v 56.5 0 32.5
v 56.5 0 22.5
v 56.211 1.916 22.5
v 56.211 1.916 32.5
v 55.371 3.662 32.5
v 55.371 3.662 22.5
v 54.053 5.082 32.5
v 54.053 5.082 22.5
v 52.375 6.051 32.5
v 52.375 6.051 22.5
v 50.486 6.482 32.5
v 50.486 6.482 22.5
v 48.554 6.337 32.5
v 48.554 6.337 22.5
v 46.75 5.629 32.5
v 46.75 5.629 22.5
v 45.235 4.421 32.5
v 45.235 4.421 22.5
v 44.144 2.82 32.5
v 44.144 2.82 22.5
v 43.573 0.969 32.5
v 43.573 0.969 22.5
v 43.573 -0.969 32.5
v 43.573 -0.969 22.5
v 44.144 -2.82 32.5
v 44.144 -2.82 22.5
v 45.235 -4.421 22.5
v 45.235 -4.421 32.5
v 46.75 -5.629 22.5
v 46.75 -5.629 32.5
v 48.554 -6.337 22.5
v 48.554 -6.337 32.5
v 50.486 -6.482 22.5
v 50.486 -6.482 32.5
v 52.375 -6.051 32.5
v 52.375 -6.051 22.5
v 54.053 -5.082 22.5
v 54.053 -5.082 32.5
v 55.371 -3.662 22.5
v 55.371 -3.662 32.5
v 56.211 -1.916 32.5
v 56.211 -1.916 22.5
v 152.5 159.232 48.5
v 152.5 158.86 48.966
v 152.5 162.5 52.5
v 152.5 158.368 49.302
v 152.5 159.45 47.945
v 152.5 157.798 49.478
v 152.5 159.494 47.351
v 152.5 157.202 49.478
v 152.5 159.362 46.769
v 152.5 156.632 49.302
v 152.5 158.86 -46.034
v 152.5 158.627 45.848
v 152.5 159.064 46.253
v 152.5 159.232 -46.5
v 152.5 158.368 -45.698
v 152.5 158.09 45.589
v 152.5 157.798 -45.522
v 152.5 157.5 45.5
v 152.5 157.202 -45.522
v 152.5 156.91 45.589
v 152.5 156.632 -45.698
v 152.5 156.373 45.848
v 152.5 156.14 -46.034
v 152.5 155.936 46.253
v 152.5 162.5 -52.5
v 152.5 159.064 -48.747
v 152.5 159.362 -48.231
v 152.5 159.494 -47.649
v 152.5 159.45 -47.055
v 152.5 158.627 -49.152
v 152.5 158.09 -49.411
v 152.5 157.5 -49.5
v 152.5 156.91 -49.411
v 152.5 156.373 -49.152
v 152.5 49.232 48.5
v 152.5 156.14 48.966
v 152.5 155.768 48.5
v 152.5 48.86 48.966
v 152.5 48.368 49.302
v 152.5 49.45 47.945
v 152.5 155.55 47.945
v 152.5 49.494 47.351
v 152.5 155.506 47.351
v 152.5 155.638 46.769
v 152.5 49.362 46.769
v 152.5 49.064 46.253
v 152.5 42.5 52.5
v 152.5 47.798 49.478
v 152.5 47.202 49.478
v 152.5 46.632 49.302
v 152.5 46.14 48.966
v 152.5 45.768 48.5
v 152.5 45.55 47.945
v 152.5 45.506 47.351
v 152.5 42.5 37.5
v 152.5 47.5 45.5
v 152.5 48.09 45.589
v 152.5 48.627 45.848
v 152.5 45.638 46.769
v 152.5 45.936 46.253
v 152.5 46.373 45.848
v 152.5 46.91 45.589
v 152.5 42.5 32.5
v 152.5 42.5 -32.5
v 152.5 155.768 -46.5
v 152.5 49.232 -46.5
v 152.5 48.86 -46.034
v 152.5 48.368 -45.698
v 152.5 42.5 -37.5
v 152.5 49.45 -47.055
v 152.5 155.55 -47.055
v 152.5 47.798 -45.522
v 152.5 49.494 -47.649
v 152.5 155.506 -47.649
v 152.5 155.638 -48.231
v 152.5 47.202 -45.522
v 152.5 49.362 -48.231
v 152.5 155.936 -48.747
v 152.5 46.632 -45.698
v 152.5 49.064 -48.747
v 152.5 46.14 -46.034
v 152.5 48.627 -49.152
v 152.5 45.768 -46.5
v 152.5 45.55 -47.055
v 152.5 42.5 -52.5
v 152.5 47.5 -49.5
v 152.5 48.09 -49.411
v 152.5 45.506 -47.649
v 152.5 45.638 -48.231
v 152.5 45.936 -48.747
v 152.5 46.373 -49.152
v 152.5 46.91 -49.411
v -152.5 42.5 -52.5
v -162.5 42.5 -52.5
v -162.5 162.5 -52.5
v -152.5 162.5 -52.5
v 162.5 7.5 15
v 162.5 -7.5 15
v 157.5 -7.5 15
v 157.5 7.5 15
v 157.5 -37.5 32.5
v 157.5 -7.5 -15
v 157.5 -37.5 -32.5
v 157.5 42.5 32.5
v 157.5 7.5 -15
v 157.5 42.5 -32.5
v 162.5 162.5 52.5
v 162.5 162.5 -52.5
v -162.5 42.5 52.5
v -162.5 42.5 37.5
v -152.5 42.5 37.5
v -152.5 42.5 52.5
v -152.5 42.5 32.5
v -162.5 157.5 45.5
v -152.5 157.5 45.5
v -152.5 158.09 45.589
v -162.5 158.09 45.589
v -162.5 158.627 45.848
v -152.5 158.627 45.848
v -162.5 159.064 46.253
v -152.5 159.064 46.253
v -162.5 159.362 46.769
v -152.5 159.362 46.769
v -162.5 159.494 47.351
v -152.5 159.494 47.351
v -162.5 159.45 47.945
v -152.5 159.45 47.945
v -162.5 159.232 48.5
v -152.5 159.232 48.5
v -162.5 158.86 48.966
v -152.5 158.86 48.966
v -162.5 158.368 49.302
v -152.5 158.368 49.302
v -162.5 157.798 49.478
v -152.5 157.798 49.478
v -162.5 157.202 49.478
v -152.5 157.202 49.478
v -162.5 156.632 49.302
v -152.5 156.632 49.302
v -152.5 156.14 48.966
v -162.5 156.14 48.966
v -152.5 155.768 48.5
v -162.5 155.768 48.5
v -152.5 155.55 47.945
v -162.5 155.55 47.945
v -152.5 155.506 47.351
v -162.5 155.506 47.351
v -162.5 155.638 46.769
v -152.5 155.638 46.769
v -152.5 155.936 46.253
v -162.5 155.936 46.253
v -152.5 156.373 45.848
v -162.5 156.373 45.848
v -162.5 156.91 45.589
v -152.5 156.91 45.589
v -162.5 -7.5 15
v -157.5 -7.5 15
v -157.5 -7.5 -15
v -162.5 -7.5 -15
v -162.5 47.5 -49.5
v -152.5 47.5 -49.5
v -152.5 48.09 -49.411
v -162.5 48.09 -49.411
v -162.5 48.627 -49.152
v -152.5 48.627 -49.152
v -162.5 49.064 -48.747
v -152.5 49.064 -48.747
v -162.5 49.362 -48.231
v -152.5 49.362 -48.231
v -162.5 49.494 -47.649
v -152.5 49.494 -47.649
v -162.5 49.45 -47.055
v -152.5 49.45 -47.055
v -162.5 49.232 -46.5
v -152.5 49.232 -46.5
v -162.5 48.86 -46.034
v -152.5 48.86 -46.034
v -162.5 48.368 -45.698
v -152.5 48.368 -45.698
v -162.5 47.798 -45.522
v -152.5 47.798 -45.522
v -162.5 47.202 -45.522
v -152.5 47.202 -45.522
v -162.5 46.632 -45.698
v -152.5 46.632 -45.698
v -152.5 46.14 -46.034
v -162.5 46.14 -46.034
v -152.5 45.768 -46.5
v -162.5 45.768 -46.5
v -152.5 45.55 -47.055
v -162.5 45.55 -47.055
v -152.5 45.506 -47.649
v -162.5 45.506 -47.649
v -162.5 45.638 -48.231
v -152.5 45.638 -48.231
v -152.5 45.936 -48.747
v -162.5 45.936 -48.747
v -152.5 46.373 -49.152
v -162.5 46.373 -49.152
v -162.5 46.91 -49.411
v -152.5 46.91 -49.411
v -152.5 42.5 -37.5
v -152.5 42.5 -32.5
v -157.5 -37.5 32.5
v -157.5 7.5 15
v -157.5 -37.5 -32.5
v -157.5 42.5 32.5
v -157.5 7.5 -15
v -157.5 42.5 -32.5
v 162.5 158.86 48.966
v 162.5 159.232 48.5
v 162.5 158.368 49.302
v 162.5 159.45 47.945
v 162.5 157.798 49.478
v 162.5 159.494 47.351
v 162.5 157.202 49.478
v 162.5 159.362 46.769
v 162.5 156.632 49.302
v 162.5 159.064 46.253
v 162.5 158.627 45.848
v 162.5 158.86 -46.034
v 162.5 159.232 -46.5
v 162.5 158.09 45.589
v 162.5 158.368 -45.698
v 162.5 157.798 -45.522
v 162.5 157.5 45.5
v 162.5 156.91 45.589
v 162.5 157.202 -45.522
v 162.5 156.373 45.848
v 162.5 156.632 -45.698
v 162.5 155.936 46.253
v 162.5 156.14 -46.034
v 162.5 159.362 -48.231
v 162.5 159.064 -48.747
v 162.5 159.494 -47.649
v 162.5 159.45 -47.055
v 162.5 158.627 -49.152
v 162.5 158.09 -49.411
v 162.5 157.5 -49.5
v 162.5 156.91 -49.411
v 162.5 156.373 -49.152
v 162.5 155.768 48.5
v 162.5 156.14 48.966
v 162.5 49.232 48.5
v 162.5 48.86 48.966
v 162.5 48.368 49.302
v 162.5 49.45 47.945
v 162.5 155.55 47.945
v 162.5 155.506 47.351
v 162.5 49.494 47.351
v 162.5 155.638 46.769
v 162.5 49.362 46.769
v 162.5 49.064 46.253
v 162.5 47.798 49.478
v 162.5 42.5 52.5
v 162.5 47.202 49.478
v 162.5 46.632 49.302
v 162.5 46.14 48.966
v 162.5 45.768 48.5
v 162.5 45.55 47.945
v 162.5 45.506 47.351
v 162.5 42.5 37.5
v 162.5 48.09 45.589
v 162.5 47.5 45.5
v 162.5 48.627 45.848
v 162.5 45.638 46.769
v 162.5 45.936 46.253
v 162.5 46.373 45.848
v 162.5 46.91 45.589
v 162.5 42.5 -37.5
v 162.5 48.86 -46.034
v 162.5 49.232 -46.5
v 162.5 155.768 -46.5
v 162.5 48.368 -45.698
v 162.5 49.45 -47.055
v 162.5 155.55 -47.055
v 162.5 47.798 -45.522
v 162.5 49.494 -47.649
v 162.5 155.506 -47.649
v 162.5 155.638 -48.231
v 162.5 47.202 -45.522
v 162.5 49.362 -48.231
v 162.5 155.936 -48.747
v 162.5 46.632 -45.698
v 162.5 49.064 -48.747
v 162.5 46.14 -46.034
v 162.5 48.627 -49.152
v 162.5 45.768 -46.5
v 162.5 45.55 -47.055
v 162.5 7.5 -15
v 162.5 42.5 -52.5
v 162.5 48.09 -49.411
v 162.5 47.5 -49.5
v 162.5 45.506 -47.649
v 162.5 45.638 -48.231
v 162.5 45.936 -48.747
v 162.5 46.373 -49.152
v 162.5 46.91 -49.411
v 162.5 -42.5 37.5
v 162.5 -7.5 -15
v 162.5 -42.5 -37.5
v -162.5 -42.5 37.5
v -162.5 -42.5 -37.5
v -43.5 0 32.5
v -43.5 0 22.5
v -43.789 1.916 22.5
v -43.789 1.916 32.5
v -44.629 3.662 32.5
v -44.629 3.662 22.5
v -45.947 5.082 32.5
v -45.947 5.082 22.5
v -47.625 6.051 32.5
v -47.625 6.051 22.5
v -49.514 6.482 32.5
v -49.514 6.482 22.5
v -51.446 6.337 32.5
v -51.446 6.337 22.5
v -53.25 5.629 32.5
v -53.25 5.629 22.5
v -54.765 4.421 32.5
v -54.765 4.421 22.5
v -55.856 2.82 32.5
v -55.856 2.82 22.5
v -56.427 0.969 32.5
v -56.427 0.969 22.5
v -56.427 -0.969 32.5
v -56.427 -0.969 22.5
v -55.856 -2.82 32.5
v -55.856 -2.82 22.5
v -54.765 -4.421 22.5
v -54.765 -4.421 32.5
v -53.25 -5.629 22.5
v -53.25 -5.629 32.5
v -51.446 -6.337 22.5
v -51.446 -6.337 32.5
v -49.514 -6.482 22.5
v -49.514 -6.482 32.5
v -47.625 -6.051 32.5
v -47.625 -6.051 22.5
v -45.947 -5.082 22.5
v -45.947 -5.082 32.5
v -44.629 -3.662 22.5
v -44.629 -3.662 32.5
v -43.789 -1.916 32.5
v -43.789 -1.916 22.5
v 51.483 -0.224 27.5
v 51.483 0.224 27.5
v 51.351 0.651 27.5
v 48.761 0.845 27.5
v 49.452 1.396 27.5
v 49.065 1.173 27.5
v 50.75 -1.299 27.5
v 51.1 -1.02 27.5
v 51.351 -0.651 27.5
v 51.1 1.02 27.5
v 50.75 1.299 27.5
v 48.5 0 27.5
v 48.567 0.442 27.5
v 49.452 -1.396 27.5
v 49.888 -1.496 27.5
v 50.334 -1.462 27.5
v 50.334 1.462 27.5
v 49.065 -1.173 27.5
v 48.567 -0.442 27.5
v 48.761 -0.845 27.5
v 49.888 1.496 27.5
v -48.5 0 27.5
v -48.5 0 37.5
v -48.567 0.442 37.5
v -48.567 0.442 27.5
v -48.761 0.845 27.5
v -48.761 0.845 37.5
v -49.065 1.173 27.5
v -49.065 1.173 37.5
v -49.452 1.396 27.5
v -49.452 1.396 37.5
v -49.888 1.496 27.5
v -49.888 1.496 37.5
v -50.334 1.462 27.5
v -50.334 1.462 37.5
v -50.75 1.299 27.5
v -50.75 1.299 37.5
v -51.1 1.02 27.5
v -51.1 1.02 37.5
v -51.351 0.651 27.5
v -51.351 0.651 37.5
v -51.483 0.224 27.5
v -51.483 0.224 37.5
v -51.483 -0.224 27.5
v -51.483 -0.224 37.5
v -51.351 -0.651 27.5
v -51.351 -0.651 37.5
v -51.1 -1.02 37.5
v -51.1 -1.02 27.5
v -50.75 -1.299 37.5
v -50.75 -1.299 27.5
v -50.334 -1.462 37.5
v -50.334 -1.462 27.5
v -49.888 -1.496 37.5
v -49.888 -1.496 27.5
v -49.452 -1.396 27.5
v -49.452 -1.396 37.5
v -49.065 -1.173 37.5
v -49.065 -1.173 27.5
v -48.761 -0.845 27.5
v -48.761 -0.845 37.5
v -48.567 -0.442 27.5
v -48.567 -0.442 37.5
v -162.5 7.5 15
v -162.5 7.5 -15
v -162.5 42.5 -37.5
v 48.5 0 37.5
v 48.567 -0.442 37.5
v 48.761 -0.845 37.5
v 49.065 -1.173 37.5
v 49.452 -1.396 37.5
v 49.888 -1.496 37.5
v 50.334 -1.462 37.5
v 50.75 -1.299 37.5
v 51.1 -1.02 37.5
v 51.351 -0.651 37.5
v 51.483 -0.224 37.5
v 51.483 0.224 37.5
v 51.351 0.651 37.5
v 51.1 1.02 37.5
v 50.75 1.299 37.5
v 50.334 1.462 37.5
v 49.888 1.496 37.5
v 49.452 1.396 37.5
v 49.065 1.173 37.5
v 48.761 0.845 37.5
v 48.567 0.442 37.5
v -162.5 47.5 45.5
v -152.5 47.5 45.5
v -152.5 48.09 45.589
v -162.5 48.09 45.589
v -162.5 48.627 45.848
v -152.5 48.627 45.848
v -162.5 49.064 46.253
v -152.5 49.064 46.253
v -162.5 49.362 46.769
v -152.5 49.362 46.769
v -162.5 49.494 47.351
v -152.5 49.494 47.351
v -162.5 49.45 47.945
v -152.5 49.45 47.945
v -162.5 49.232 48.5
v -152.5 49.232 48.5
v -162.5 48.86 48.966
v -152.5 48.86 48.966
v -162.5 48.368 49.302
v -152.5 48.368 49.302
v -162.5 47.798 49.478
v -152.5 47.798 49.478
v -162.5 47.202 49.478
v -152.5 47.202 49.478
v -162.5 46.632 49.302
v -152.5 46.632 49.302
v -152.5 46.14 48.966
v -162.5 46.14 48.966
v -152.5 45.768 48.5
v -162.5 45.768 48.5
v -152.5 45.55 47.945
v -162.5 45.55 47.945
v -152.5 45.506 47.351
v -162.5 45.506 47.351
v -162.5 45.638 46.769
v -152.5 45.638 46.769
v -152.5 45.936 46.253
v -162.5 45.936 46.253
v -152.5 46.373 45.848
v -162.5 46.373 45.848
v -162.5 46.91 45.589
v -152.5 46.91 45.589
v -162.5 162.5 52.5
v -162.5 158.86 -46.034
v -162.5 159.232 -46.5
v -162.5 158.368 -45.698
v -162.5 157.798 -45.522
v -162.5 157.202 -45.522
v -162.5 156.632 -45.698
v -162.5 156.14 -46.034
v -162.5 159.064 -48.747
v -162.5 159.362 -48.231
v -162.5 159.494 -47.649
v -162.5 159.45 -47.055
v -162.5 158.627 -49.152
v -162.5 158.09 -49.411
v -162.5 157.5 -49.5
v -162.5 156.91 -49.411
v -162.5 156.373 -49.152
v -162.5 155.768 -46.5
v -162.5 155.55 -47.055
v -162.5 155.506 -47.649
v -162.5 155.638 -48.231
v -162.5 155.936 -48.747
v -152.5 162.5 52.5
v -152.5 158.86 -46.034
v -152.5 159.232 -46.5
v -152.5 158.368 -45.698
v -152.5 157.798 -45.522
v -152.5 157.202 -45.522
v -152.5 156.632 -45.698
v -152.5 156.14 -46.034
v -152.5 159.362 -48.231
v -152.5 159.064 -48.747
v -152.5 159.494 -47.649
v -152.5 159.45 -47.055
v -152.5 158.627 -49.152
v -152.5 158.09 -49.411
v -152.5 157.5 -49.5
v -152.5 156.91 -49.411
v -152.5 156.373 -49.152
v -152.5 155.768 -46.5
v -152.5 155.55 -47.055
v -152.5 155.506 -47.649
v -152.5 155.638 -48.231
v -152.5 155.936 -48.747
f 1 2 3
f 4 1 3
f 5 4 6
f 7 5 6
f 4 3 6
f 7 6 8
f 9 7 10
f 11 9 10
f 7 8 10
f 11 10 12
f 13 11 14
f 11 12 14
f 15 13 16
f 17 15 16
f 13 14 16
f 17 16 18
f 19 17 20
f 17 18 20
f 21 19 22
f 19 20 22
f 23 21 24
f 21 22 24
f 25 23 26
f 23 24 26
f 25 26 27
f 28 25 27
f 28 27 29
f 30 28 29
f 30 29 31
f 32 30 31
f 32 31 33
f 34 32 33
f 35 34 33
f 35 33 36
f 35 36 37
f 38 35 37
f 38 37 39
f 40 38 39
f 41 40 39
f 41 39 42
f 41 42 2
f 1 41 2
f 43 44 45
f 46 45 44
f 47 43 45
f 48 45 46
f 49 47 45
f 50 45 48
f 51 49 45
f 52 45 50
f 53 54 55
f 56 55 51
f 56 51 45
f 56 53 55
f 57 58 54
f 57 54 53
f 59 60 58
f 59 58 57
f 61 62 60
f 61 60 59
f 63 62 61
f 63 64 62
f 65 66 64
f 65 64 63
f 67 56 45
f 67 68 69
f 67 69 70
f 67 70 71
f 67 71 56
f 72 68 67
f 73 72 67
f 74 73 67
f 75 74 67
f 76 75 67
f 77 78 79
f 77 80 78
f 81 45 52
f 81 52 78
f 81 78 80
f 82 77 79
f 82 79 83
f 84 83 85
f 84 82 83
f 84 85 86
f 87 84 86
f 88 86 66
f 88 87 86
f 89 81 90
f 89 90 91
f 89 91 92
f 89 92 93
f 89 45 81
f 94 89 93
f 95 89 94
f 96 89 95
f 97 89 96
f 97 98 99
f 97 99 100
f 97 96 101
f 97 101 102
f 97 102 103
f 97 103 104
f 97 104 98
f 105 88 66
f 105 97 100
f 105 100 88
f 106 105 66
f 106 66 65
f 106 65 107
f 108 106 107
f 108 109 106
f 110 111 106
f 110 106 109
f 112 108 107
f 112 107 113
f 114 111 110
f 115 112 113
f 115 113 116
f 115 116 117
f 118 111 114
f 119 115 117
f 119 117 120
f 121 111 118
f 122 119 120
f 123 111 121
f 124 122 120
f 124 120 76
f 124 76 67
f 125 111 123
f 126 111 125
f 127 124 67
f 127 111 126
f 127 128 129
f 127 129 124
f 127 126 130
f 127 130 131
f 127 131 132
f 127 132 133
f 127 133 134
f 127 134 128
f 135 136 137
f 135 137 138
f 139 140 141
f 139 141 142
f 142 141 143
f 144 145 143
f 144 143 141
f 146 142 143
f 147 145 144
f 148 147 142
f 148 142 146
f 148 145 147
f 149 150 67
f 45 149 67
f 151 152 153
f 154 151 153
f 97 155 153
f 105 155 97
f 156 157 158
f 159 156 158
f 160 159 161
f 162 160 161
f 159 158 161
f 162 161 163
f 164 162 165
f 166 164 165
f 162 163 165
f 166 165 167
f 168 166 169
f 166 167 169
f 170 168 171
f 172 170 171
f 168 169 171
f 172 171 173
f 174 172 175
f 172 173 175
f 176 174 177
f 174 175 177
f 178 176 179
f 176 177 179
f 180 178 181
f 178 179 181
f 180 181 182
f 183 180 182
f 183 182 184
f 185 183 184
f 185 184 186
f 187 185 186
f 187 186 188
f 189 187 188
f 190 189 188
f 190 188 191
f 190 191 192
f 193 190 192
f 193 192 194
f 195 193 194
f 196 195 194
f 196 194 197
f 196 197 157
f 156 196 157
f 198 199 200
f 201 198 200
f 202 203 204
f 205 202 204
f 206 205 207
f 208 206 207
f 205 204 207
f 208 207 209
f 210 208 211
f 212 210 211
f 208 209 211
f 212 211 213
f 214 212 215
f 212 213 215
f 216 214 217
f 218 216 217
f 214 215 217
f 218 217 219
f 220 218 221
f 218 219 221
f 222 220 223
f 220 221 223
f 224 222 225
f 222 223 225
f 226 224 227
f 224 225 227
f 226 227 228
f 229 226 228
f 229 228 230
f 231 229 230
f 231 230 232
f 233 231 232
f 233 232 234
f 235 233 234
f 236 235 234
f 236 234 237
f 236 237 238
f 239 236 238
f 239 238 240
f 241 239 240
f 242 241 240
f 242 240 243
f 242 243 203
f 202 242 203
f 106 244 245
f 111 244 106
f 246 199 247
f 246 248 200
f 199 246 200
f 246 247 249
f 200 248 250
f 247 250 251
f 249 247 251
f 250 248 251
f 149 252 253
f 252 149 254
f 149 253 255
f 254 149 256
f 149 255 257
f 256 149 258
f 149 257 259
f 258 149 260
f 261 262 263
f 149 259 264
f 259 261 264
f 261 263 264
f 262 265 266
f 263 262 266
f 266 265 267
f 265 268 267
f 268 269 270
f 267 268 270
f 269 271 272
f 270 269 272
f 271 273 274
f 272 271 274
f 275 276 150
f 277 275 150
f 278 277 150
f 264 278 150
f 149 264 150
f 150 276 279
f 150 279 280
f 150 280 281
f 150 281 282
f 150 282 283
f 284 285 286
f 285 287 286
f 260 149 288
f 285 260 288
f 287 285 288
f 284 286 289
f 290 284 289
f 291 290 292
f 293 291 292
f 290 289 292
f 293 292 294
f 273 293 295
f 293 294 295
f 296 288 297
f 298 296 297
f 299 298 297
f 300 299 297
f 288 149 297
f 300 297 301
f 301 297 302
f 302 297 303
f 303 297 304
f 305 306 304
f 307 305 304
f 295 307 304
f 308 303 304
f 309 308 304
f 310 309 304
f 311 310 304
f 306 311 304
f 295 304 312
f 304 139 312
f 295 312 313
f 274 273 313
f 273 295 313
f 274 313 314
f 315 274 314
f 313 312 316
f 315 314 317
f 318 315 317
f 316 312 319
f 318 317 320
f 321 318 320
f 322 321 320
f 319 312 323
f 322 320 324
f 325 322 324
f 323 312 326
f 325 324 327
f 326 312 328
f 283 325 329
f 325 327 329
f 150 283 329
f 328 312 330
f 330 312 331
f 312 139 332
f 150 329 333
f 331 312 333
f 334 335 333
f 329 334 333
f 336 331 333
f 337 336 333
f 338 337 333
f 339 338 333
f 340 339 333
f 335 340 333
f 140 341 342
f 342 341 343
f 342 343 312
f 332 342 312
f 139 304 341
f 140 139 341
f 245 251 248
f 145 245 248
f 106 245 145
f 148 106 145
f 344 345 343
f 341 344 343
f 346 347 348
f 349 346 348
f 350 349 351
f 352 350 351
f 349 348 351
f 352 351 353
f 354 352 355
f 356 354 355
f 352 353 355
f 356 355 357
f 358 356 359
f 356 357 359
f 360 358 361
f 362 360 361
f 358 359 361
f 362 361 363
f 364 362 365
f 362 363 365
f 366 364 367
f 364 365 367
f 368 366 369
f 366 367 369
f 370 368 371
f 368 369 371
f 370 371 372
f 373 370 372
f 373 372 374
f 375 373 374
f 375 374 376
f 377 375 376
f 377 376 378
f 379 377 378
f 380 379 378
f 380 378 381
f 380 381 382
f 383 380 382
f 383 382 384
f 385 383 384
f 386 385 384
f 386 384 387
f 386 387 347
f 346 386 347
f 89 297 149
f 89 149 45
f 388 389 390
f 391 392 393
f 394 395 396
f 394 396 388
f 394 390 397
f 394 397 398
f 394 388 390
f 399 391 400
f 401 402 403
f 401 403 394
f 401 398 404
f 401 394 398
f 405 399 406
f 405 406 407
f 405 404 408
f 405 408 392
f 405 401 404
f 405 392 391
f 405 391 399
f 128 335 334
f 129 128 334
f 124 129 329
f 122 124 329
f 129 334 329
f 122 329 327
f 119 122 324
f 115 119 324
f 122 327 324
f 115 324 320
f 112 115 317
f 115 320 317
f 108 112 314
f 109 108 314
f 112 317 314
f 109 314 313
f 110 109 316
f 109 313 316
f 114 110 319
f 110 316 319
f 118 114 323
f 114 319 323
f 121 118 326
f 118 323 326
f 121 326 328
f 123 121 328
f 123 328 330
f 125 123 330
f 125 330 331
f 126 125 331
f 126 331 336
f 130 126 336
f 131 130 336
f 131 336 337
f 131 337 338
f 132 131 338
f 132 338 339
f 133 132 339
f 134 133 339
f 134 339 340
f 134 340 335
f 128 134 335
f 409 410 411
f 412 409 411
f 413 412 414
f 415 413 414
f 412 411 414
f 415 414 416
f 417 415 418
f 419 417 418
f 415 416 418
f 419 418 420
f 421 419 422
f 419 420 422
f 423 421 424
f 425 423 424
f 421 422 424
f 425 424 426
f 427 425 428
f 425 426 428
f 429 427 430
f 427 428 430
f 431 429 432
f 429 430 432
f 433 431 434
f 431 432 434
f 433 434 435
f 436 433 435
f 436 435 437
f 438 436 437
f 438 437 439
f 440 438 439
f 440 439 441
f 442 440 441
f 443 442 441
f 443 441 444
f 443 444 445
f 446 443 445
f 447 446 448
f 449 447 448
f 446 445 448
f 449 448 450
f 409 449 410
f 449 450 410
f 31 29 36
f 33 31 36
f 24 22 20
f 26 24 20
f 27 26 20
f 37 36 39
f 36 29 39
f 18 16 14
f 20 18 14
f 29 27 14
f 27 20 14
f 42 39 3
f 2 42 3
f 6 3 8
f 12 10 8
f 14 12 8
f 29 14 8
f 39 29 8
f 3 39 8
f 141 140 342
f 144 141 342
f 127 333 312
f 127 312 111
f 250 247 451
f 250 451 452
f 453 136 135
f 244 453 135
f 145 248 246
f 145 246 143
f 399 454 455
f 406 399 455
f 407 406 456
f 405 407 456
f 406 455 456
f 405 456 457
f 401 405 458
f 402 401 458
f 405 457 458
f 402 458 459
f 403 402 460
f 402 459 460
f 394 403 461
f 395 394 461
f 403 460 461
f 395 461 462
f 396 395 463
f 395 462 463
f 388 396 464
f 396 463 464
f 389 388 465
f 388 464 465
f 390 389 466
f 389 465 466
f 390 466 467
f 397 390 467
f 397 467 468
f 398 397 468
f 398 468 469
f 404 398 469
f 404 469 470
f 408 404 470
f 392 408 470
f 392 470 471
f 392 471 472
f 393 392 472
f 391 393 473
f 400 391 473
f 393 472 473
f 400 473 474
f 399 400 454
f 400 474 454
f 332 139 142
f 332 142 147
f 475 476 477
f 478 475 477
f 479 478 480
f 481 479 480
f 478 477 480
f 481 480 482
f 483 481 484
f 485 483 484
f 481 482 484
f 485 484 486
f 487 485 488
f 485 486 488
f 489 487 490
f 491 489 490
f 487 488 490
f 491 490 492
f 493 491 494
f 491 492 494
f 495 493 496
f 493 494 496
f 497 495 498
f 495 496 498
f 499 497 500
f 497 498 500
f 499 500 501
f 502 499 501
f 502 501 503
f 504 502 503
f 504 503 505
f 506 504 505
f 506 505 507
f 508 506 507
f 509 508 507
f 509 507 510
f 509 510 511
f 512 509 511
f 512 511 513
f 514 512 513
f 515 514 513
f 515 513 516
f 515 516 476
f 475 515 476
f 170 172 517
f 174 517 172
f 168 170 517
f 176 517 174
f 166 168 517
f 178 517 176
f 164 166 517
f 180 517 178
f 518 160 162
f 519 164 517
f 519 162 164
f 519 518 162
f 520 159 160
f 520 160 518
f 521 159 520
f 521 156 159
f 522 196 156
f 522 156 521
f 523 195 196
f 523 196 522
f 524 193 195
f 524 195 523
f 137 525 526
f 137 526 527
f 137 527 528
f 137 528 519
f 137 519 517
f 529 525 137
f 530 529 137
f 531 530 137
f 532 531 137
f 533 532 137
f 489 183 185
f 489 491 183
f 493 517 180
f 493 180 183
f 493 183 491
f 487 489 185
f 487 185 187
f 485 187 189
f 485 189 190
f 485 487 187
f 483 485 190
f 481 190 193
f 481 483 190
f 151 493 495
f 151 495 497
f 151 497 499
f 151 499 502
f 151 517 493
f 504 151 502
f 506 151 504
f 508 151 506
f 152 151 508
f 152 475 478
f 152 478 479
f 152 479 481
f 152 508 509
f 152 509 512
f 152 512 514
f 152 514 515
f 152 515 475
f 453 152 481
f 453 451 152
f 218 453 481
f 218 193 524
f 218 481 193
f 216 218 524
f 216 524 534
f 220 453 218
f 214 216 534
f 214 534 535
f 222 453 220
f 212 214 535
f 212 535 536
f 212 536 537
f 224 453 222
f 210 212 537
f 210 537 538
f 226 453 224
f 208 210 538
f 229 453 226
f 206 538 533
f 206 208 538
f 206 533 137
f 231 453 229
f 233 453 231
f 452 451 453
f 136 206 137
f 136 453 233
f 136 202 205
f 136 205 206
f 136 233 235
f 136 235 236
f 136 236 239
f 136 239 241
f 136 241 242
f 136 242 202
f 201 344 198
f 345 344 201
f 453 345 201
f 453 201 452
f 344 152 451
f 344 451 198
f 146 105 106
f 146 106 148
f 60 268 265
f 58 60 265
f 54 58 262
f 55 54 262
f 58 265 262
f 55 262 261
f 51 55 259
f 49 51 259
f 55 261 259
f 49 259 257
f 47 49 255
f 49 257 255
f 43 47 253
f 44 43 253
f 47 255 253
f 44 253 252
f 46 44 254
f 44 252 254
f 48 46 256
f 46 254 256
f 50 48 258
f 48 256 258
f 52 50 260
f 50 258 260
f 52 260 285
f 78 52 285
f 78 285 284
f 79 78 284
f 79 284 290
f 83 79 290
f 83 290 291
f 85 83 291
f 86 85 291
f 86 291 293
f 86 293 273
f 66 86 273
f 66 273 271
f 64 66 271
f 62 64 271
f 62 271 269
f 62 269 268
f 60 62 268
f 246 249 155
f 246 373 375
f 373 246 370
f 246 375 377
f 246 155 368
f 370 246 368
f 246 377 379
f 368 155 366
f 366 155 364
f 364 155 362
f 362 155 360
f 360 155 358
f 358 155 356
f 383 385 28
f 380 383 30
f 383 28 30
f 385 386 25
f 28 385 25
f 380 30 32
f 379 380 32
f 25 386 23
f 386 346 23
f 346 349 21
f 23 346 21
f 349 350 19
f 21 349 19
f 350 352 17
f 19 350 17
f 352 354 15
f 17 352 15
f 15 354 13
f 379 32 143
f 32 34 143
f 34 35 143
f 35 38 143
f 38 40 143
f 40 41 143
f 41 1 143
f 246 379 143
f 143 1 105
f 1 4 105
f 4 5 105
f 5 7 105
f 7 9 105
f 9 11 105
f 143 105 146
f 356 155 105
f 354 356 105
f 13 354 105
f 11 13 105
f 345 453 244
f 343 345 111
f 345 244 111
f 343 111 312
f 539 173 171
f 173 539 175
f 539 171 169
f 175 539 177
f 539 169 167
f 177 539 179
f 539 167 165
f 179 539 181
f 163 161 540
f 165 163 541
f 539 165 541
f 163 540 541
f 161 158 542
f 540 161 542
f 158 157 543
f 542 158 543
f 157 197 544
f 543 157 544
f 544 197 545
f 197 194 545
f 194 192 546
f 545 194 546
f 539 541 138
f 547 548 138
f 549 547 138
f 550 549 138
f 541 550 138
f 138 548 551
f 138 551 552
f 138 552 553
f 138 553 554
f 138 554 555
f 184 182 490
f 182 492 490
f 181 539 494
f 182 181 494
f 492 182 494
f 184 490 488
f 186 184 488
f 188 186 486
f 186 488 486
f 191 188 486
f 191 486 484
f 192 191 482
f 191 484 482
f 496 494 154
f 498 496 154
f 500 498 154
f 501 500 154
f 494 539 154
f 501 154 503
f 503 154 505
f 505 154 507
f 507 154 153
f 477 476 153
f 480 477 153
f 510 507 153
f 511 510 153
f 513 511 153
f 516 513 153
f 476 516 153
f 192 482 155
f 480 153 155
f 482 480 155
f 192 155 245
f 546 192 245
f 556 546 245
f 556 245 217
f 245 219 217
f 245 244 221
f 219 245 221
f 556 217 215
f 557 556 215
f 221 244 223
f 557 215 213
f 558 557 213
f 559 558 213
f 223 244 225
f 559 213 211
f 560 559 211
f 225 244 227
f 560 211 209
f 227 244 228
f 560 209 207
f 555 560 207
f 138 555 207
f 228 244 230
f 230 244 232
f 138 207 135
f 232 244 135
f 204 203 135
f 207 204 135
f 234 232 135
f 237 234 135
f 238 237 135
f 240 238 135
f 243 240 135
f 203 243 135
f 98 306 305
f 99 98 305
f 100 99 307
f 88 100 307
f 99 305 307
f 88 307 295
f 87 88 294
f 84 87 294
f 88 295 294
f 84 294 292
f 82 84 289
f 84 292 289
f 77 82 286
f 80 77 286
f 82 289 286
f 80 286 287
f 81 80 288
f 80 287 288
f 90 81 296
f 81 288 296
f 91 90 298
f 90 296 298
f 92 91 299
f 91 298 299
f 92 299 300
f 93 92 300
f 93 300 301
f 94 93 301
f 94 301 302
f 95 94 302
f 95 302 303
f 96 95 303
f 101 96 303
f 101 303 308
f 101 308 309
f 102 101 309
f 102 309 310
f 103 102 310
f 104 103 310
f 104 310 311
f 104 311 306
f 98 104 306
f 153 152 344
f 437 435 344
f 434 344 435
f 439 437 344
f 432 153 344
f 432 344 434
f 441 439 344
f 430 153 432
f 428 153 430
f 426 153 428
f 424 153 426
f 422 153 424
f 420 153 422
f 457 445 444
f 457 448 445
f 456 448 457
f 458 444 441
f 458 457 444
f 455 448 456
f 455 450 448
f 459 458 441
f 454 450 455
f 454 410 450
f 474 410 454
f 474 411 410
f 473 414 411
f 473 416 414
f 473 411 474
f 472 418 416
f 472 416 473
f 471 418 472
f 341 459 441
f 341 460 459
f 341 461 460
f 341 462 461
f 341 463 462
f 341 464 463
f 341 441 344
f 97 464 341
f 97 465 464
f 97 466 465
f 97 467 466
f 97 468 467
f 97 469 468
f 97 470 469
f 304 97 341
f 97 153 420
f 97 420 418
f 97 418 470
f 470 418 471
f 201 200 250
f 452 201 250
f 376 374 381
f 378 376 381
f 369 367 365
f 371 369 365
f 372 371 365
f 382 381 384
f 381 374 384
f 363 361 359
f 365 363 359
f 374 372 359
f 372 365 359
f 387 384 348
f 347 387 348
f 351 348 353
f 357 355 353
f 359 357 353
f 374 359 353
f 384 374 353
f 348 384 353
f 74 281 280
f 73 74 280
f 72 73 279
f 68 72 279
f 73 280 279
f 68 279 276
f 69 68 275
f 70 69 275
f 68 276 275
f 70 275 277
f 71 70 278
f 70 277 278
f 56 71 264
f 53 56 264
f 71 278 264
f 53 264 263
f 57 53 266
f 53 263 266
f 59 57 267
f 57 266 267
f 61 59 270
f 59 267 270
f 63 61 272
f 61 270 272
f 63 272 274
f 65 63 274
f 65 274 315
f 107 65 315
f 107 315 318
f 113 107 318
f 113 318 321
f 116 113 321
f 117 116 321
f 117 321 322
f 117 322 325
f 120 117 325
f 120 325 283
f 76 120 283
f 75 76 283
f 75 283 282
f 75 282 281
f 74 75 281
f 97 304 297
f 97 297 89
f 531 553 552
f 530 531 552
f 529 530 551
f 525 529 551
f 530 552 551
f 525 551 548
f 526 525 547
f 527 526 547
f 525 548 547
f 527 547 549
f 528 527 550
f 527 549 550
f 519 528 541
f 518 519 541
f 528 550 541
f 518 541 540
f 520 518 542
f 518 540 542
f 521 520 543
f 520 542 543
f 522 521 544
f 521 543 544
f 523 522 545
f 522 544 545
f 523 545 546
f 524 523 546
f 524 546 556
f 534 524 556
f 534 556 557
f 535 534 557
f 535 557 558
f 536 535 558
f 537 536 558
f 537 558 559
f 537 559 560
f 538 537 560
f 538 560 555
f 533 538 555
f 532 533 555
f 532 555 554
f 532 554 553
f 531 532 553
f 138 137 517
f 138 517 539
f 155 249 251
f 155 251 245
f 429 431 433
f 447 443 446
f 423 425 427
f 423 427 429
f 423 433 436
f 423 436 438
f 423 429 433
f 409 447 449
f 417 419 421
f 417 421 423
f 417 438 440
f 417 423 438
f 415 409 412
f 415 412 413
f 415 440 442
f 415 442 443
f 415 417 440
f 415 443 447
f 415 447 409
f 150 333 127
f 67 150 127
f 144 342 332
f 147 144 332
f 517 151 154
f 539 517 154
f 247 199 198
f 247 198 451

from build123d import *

# Parameters (mm, degrees)
SKETCH1_W           = 325
SKETCH1_H           = 75
BOSS_EXTRUDE1_DEPTH = 42.5
SKETCH2_R           = 1.5
CUT_EXTRUDE1_DEPTH  = 10
SKETCH3_W           = 10
SKETCH3_H           = 105
BOSS_EXTRUDE2_DEPTH = 120
SHELL1_START        = -32.5
SHELL1_OUTLINE_W    = 315
SHELL1_OUTLINE_H    = 80
SHELL1_OUTLINE_R    = 6.5
SHELL1_DEPTH        = 65
SHELL1_2_OUTLINE_R  = 6.5
SHELL1_2_DEPTH      = 55
SKETCH4_W           = 30
SKETCH4_H           = 15
CUT_EXTRUDE2_DEPTH  = 368.134171659
SKETCH5_R           = 2
CUT_EXTRUDE3_DEPTH  = 368.134171659


# Read off the part's stored shape, not the designer's step: Shell1
with BuildPart() as part:
    # Sketch1 → Boss-Extrude1 (new, symmetric)
    with BuildSketch(Plane(origin=(0, 0, 0), x_dir=(1, 0, 0), z_dir=(0, 1, 0))):
        Rectangle(SKETCH1_W, SKETCH1_H)
    extrude(amount=BOSS_EXTRUDE1_DEPTH, both=True)

    # Sketch2 → Cut-Extrude1 (cut)
    with BuildSketch(Plane.XY.offset(37.5)):
        with Locations((-50, 0)):
            Circle(SKETCH2_R)
        with Locations(Location((50, 0, 0), (0, 0, 180))):
            Circle(SKETCH2_R)
    extrude(amount=-CUT_EXTRUDE1_DEPTH, mode=Mode.SUBTRACT)

    # Sketch3 → Boss-Extrude2 (add)
    with BuildSketch(Plane(origin=(0, 42.5, 0), x_dir=(1, 0, 0), z_dir=(0, 1, 0))):
        with Locations((-157.5, 0)):
            Rectangle(SKETCH3_W, SKETCH3_H)
    boss_extrude2 = extrude(amount=BOSS_EXTRUDE2_DEPTH)

    # Mirror1: Boss-Extrude2 across plane
    add(boss_extrude2.mirror(Plane(origin=(0, 0, 0), x_dir=(0, 0, 1), z_dir=(1, 0, 0))))

    # Shell1 outline → Shell1 (cut)
    with BuildSketch(Plane.XY.offset(SHELL1_START)):
        with Locations((0, 2.5)):
            Rectangle(SHELL1_OUTLINE_W, SHELL1_OUTLINE_H)
        with Locations((-50, 0)):
            Circle(SHELL1_OUTLINE_R, mode=Mode.SUBTRACT)
        with Locations((50, 0)):
            Circle(SHELL1_OUTLINE_R, mode=Mode.SUBTRACT)
    extrude(amount=SHELL1_DEPTH, mode=Mode.SUBTRACT)

    # Shell1 2 outline → Shell1 2 (cut)
    with BuildSketch(Plane.XY.offset(SHELL1_START)):
        with Locations((50, 0)):
            Circle(SHELL1_2_OUTLINE_R)
        with Locations((-50, 0)):
            Circle(SHELL1_2_OUTLINE_R)
    extrude(amount=SHELL1_2_DEPTH, mode=Mode.SUBTRACT)

    # Sketch4 → Cut-Extrude2 (cut, through all)
    with BuildSketch(Plane(origin=(162.5, 0, 0), x_dir=(0, 0, -1), z_dir=(1, 0, 0))):
        Rectangle(SKETCH4_W, SKETCH4_H)
    extrude(amount=-CUT_EXTRUDE2_DEPTH, mode=Mode.SUBTRACT)

    # Sketch5 → Cut-Extrude3 (cut, through all)
    with BuildSketch(Plane(origin=(162.5, 0, 0), x_dir=(0, 0, -1), z_dir=(1, 0, 0))):
        with Locations((-47.5, 47.5)):
            Circle(SKETCH5_R)
        with Locations((47.5, 47.5)):
            Circle(SKETCH5_R)
        with Locations((47.5, 157.5)):
            Circle(SKETCH5_R)
        with Locations((-47.5, 157.5)):
            Circle(SKETCH5_R)
    extrude(amount=-CUT_EXTRUDE3_DEPTH, mode=Mode.SUBTRACT)


solid = part.part
